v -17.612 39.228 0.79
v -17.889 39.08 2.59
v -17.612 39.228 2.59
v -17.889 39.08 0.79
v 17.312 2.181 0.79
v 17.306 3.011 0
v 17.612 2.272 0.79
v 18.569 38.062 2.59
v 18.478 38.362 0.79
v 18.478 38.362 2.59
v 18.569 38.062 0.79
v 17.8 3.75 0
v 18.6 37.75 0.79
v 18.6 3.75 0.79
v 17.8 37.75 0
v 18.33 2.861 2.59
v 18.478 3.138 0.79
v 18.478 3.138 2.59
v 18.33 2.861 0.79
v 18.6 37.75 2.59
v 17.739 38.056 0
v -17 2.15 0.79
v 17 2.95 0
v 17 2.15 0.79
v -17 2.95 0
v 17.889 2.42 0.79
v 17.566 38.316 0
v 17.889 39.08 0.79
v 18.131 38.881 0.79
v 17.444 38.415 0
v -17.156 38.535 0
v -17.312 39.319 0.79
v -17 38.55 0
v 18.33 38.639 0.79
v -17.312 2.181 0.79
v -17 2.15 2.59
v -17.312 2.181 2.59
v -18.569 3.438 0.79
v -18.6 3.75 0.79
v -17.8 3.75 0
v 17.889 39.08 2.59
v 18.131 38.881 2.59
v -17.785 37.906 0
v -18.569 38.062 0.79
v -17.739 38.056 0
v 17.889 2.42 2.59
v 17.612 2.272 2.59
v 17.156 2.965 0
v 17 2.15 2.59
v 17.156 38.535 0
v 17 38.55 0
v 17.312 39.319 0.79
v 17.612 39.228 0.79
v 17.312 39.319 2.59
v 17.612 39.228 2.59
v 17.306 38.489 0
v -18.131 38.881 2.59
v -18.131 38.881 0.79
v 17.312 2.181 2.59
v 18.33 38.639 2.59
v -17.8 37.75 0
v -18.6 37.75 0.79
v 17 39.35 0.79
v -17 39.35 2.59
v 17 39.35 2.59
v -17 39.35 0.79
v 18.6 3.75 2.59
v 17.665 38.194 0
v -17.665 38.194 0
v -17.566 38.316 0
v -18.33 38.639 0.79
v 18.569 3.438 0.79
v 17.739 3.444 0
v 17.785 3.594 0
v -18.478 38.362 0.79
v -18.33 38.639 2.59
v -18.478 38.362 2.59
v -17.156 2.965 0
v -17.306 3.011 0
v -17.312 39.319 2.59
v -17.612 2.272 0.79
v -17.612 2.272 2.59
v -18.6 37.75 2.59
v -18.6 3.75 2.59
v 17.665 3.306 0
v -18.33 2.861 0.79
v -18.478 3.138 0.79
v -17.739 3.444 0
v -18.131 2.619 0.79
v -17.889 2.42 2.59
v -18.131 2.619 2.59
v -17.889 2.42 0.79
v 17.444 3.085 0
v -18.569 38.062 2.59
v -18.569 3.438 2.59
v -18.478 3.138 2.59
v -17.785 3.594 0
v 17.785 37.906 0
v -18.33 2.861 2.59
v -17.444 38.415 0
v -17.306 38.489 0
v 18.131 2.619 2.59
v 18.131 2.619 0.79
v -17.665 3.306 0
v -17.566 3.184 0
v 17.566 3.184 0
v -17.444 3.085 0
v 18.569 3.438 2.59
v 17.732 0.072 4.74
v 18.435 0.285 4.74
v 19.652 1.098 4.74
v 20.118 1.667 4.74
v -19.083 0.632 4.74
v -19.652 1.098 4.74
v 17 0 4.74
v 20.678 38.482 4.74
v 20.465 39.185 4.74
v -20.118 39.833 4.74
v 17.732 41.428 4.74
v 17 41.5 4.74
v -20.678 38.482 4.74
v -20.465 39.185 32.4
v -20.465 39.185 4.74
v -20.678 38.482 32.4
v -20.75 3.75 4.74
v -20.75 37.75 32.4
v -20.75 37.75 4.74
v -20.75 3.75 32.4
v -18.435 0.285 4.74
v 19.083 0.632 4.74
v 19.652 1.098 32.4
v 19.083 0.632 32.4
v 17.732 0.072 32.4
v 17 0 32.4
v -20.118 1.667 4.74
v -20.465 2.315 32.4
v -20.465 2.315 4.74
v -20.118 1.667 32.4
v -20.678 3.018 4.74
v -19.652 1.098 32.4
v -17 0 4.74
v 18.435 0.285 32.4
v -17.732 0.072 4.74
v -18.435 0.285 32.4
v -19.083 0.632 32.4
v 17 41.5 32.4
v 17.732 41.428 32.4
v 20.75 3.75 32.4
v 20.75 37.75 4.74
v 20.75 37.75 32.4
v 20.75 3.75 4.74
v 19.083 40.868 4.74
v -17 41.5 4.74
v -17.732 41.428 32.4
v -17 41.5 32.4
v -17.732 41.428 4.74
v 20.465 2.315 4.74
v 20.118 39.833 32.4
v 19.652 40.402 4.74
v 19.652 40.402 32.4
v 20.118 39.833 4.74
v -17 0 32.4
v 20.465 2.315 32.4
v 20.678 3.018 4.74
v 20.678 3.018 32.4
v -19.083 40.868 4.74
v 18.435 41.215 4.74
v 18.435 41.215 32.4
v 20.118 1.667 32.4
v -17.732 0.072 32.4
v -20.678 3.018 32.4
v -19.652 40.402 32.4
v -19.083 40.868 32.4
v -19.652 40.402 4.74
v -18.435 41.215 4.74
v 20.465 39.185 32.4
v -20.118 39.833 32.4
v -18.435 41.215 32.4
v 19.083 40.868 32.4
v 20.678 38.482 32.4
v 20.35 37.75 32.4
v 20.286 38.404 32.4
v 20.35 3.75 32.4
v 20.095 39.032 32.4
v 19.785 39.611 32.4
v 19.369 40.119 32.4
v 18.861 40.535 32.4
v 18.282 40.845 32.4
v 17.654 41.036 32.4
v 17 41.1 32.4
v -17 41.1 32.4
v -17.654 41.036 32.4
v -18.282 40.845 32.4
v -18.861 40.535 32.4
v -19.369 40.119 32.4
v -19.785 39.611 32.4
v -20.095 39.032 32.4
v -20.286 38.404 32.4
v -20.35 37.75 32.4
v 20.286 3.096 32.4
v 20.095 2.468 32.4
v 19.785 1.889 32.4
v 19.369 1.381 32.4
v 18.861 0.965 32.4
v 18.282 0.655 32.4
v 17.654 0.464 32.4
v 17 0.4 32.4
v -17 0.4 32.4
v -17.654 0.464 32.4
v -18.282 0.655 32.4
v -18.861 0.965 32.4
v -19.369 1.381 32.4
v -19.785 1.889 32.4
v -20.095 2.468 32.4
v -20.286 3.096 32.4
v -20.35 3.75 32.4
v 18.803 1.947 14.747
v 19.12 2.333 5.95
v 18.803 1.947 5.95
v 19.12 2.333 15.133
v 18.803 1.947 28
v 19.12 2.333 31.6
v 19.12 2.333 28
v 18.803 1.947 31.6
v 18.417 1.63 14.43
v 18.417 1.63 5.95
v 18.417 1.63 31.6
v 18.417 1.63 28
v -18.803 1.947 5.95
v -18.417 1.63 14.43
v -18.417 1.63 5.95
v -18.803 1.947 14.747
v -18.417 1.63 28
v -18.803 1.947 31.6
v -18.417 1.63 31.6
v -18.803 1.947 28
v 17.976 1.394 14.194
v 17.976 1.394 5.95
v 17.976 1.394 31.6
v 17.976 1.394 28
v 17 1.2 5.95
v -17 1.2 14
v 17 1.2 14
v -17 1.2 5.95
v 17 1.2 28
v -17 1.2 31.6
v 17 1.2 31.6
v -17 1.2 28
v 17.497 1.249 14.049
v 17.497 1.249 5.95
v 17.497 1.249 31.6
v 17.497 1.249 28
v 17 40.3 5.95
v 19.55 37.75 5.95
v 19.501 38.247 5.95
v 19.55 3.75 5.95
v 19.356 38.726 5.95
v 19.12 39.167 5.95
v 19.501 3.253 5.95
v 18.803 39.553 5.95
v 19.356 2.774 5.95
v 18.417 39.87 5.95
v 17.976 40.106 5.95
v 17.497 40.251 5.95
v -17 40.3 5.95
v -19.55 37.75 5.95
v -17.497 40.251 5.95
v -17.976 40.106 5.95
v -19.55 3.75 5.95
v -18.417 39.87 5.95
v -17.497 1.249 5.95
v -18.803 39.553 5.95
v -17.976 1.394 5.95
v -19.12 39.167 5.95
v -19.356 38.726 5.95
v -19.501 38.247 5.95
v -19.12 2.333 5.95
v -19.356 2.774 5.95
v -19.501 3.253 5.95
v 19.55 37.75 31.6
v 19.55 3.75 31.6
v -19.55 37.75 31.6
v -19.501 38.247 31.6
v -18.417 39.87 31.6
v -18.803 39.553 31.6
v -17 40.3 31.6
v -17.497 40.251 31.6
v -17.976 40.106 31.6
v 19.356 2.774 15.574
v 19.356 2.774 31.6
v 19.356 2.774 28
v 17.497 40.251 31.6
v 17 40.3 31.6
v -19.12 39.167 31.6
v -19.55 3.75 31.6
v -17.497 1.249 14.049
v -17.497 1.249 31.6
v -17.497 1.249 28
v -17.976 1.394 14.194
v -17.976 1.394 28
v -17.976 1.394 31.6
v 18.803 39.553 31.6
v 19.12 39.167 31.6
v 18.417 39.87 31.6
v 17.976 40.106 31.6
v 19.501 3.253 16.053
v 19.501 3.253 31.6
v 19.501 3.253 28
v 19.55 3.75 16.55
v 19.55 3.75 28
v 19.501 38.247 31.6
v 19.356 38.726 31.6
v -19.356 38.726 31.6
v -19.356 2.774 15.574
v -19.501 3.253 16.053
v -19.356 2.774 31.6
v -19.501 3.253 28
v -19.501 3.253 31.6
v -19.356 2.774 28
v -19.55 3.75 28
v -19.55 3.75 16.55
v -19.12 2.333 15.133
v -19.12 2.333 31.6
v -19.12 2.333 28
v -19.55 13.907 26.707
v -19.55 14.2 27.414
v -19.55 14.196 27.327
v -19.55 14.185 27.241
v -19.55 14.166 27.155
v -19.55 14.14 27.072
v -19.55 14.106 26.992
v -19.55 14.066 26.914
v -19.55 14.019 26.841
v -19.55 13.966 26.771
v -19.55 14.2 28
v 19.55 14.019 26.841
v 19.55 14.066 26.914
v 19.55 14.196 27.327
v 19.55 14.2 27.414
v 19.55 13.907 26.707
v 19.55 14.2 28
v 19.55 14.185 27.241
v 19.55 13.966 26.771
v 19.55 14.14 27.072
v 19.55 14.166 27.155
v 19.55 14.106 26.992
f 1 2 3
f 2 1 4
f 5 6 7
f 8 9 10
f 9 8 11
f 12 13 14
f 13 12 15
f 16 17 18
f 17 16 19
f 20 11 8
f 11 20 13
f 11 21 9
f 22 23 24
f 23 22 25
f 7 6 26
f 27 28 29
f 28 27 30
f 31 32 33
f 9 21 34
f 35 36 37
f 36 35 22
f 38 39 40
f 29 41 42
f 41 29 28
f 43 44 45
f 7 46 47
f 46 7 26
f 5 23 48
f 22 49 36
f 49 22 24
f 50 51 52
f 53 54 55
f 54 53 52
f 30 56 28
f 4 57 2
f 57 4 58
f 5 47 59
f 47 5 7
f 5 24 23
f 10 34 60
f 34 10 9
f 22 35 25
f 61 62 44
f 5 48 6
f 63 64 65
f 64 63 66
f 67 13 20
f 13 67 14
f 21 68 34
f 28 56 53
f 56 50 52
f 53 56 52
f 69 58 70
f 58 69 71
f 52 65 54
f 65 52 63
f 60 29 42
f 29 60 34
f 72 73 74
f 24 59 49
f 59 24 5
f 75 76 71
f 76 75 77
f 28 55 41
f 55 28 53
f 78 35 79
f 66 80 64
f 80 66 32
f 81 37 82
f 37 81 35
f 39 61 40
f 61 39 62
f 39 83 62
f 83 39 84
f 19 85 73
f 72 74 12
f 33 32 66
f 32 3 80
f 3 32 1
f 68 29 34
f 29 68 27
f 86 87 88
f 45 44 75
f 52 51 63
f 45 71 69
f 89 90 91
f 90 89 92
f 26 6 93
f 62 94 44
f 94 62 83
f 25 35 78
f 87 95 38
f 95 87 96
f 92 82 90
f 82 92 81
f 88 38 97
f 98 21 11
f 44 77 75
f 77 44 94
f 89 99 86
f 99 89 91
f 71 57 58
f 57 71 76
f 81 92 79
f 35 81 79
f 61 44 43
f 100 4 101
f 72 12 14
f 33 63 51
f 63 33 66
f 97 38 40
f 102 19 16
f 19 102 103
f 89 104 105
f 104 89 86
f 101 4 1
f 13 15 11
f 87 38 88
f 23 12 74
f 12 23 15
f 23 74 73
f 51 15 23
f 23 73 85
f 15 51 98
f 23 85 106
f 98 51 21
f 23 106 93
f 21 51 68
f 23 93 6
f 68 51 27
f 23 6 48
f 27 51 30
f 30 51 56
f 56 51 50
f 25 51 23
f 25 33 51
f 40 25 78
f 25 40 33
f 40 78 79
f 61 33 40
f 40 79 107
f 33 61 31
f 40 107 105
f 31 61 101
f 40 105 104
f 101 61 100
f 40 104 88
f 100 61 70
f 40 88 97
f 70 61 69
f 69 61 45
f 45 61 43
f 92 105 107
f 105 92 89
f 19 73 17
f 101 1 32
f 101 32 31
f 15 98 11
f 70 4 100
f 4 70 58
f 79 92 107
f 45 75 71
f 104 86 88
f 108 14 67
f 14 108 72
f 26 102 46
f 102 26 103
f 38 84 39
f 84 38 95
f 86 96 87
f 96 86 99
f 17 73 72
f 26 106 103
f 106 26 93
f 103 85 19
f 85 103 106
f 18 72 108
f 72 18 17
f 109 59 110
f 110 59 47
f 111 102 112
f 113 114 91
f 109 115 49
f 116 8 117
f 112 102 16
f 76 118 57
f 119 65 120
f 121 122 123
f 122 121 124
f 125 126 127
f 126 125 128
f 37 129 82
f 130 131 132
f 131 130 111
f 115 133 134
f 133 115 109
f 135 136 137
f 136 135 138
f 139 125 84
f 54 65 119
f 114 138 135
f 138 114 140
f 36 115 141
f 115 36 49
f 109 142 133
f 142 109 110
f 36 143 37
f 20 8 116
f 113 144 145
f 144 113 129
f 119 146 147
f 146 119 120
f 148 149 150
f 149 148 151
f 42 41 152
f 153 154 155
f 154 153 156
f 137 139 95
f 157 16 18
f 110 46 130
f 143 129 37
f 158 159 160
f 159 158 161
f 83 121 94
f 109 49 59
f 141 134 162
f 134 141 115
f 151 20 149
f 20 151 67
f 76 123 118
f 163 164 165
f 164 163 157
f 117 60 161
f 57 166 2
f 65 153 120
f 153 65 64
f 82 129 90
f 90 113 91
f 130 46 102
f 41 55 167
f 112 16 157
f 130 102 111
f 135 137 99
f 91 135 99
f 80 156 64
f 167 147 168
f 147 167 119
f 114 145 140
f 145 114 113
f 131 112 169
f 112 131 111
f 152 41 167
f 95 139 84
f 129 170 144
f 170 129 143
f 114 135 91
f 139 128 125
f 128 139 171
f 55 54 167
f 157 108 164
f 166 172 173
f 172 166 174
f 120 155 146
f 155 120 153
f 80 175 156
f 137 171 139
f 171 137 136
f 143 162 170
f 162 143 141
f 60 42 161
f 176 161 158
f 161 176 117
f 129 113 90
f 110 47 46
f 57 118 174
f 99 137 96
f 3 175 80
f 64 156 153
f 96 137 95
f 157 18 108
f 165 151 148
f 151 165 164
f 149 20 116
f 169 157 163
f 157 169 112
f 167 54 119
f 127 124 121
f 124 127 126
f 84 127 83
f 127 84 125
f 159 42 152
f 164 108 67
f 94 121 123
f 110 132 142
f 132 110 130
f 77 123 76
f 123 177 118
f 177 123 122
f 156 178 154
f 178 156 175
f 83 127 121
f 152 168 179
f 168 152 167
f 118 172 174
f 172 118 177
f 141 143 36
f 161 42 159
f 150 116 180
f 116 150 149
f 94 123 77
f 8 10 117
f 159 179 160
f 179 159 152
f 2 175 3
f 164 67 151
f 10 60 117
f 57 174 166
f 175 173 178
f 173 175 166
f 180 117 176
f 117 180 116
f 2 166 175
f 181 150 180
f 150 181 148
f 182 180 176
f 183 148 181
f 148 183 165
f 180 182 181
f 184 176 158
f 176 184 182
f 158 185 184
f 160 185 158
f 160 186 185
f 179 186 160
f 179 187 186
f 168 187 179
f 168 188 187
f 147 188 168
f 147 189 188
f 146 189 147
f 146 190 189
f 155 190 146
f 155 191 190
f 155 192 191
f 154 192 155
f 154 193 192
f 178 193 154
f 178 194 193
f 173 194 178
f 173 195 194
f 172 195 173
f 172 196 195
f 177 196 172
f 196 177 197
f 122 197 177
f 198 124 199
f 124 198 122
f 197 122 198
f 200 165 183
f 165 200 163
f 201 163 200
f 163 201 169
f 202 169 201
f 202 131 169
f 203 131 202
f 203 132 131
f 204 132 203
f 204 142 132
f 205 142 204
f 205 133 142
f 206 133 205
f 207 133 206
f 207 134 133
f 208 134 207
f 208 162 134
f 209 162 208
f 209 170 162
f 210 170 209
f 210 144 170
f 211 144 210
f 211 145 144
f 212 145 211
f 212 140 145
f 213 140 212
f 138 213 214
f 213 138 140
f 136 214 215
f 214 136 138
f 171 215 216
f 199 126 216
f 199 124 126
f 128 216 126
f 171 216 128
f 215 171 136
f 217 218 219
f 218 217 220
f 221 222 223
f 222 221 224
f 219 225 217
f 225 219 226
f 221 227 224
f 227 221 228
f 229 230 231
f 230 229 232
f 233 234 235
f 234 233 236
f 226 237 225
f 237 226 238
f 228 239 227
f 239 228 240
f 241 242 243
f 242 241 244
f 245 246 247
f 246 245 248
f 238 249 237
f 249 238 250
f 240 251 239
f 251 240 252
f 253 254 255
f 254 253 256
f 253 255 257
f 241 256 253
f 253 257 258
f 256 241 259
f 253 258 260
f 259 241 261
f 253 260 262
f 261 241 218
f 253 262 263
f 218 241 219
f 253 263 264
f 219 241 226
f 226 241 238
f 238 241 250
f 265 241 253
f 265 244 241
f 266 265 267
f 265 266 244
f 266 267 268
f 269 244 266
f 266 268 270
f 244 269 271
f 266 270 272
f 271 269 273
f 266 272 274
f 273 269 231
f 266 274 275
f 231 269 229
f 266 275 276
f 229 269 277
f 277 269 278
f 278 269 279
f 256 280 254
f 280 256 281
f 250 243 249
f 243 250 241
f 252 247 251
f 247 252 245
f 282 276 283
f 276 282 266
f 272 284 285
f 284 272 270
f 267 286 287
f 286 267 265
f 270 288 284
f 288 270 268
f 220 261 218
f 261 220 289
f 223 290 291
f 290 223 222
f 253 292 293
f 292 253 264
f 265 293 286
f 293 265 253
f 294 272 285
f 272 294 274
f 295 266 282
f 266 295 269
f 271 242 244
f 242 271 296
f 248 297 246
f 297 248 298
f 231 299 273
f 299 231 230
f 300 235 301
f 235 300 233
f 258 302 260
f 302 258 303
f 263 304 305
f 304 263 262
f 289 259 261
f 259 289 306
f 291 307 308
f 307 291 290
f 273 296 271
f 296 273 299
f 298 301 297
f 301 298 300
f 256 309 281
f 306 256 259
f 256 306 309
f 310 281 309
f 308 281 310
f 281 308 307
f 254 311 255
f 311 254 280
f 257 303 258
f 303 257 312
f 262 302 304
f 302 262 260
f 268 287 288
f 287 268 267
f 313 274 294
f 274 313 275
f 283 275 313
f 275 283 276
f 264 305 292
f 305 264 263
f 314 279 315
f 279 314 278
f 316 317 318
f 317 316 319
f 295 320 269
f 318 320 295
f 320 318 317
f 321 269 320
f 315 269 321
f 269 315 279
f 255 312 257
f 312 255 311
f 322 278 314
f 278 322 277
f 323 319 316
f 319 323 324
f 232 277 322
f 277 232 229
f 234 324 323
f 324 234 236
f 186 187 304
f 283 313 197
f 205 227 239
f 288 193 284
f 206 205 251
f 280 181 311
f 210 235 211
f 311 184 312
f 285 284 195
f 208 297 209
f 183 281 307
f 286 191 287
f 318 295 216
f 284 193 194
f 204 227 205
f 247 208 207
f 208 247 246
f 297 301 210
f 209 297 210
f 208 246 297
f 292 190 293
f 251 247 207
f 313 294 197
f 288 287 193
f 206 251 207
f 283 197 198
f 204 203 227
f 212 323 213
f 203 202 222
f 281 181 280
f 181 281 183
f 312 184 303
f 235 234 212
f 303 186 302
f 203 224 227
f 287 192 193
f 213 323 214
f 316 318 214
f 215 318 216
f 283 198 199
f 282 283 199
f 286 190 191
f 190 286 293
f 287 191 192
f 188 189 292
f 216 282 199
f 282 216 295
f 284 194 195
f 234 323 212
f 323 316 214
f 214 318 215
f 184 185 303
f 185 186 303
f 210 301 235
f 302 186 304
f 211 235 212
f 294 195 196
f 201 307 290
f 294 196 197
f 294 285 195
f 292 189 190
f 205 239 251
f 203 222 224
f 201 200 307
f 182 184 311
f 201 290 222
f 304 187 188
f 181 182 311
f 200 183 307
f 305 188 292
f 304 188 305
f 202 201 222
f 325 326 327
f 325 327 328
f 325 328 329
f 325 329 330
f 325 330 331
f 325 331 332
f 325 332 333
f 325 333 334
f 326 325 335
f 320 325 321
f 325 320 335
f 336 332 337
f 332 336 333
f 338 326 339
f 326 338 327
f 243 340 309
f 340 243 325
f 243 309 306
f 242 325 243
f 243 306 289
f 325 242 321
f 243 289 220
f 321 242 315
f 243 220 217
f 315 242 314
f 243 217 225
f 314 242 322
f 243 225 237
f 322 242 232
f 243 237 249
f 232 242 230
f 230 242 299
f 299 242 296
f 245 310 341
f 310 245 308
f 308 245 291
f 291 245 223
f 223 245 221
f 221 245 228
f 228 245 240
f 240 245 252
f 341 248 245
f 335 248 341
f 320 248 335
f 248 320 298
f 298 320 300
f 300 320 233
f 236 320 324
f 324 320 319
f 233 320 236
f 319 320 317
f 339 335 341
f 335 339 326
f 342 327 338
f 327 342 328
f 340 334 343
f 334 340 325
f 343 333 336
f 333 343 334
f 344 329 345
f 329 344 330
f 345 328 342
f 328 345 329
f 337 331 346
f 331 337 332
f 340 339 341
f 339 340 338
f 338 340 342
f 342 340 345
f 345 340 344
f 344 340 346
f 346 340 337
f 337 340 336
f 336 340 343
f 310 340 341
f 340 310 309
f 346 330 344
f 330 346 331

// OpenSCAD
// file: ../../../modules/gridfinity.scad
// Gridfinity ベースプレートの共有 module。
// 寸法は Gridfinity 仕様 (Zack Freedman) の baseplate 輪郭に従う:
//   ピッチ 42、ソケット上端開口 41.5 (角 R4)、上から 45° 面取り 2.15 →
//   垂直 1.8 (37.2 角・R1.85) → 45° 面取り 0.7 → 底 35.8 角 (R1.15)。
//   ソケット深さ = 2.15 + 1.8 + 0.7 = 4.65。
//
// 座標系: X が列方向 (中央が 0)、Y が行方向 (板の前端が 0)、Z=0 が板の底面。
// 板の外形は grid とは独立に rim で与えるので、grid より大きい板 (縁付き) を
// 作れる。ソケットは rim=[left, right, front, back] の内側へ 42 ピッチで並ぶ。

gf_pitch = 42;
gf_socket_top = 41.5; // 上端開口
gf_socket_mid = 37.2; // 垂直部
gf_socket_bot = 35.8; // 底
gf_socket_r_top = 4;
gf_socket_r_mid = 1.85;
gf_socket_r_bot = 1.15;
gf_chamfer_top = 2.15;
gf_wall_h = 1.8;
gf_chamfer_bot = 0.7;
gf_socket_depth = gf_chamfer_top + gf_wall_h + gf_chamfer_bot; // 4.65
gf_fn = 32;
gf_eps = 0.01; // hull 用の薄板の厚さ
gf_over = 0.5; // 切削の抜き代

// 角丸正方形または矩形 (w は一辺、または [幅, 奥行き]、角 R)
module
gf_rounded_square(w, r)
{
    offset(r = r, $fn = gf_fn)
        square(is_list(w) ? w - [ 2 * r, 2 * r ] : w - 2 * r, center = true);
}

// 厚さ gf_eps の角丸正方形の薄板を z に置く (hull の骨)
module
gf_slab(w, r, z)
{
    translate([ 0, 0, z ]) linear_extrude(gf_eps) gf_rounded_square(w, r);
}

// ソケット1個の切削体。z=0 がソケットの底 (床の天面)、+Z へ 4.65 で天面に出る。
// clearance は嵌合の逃げで、輪郭を全周へ clearance だけ外へ出す (幅 +2c、角 R
// +c)。pitch_x は X 方向のセル幅。端数でも角 R と面取りの寸法を保つ。
module
gf_socket_cut(clearance = 0, pitch_x = gf_pitch)
{
    z1 = gf_chamfer_bot;
    z2 = z1 + gf_wall_h;
    z3 = gf_socket_depth;
    c = clearance;
    assert(pitch_x > gf_pitch - gf_socket_top + 2 * gf_socket_r_top,
           "Cell width is too small for the socket corner radius");
    delta = [ pitch_x - gf_pitch, 0 ];
    bot = [ gf_socket_bot + 2 * c, gf_socket_bot + 2 * c ] + delta;
    mid = [ gf_socket_mid + 2 * c, gf_socket_mid + 2 * c ] + delta;
    top = [ gf_socket_top + 2 * c, gf_socket_top + 2 * c ] + delta;
    hull()
    {
        gf_slab(bot, gf_socket_r_bot + c, 0);
        gf_slab(mid, gf_socket_r_mid + c, z1 - gf_eps);
    }
    hull()
    {
        gf_slab(mid, gf_socket_r_mid + c, z1 - gf_eps);
        gf_slab(mid, gf_socket_r_mid + c, z2 - gf_eps);
    }
    hull()
    {
        gf_slab(mid, gf_socket_r_mid + c, z2 - gf_eps);
        gf_slab(top, gf_socket_r_top + c, z3 - gf_eps);
    }
    // 天面より上へ抜く (天面と同一平面の退化した面を残さない)
    gf_slab(top, gf_socket_r_top + c, z3 - gf_eps);
    translate([ 0, 0, z3 - gf_eps ]) linear_extrude(gf_over + gf_eps)
        gf_rounded_square(top, gf_socket_r_top + c);
}

// ベースプレート。cols x rows のソケットを床 floor_t の上に彫る。
// rim = [left, right, front, back] はソケット列の外側に残す縁の幅。
// 板の幅 = cols*42 + left + right、奥行き = rows*42 + front + back。
// cols の端数は左端の細幅セルになる。rows は正の整数。
// clearance はソケットの嵌合の逃げ (gf_socket_cut を参照)。
module
gf_baseplate(cols, rows, rim = [ 0, 0, 0, 0 ], floor_t = 1, clearance = 0)
{
    grid_w = cols * gf_pitch;
    grid_d = rows * gf_pitch;
    plate_w = grid_w + rim[0] + rim[1];
    plate_d = grid_d + rim[2] + rim[3];
    x0 = -plate_w / 2 + rim[0]; // ソケット列の左端
    first_pitch = grid_w - (ceil(cols) - 1) * gf_pitch;
    difference()
    {
        translate([ -plate_w / 2, 0, 0 ])
            cube([ plate_w, plate_d, floor_t + gf_socket_depth ]);
        for (c = [0:ceil(cols) - 1], r = [0:rows - 1])
            translate([
                x0 + (c == 0 ? first_pitch / 2
                             : first_pitch + (c - 0.5) * gf_pitch),
                rim[2] + (r + 0.5) * gf_pitch,
                floor_t
            ]) gf_socket_cut(clearance, c == 0 ? first_pitch : gf_pitch);
    }
}
// file: ../../../modules/gridfinity_bins.scad
include <gridfinity_bin.scad>

// assets/gridfinity-bin/ の bin 群の共通値と、サイズ 3 引数の払い出し口。
// 単体では何も描かない。設計の経緯と確定値は
// ledger/designs/gridfinity-bin-4u.md が正本。
// 通常binは4U/9U、X={1,1.5,2,2.5,3} × Y={1,2,3,4,5,5.5}。
// 両軸に端数を持つ組み合わせはassetに置かない（各高さ28種）。
// Xが横、Yがラベルの壁から奥、unitsが高さ（7mm単位）。
wall = 1.2;    // 0.4 ノズル 3 本
floor_t = 1.2; // 底 (4.75) の上に載せる床。床の天面 z = 5.95
label_d = 13;  // 12mm 幅のラベルシールを貼る天板の張り出し
label_t = 1; // 天板の厚さ (user 指定)。下は 45° の無垢のくさび
label_r = 1; // 天板の先端と 45° 面の境目の R (user 指定)
// カードケース (goods/card_case_2x3x4u.scad) の値。カードは ISO/IEC 7810 ID-1 (85.6 × 54 ×
// 0.76、隅 R3) で、長辺を Y (rows 方向) に寝かせ、X 中央・手前の壁から 10 奥に置く。ポケットは
// カードより 1 大きい (片側 0.5)。右奥のマスは壁の内面まで抜き、床と底を外形に平行な 45° の窪みにする。
// ポケットの左右の埋めの天面 (幅 13.05) が 12mm のラベルを貼る帯。ポケットと穴の交点の
// 縦エッジは丸める (開口の上縁は丸めない: 壁を上端まで垂直に保ち、収まる枚数を減らさない)
card_w = 54;    // カードの短辺 (X)。user 指定「高さ 54」
card_d = 85.6;  // カードの長辺 (Y)。user 指定「幅 85.6」
card_clear = 1; // ポケットの余裕 (user 指定「+1mm」)
// ポケットの手前の辺の、手前の壁の内面からの距離 (user 指定「10mm」)
card_off = 10;
// ポケットの平面の隅 R (user 指定「角の丸み 3mm」。ID-1 の隅は 2.88..3.48)
card_r = 3;
// ポケットと穴が交わる所の、埋めの凸の縦エッジの R (指の当たる角)
card_edge_r = 2;
recess_skin = floor_t + 1.75; // 窪みの床 z (底の皮)。user 指定「壁厚と同じ 1.2 は過剰、1.75 返す」

function bin_contract(cols, rows, units) = str("CONTRACT units=",
                                               units,
                                               " pitch=",
                                               gf_pitch,
                                               " outer=",
                                               gfb_outer,
                                               " h=",
                                               units* gfb_unit,
                                               " lip=",
                                               gfb_lip_h,
                                               " base=",
                                               gfb_base_bot,
                                               "/",
                                               gfb_base_mid,
                                               "/",
                                               gfb_outer,
                                               " base_h=",
                                               gfb_base_h,
                                               " wall=",
                                               wall,
                                               " floor_top=",
                                               gfb_base_h + floor_t,
                                               " label=",
                                               label_d,
                                               "x",
                                               label_t,
                                               " wedge=45 fillet=",
                                               label_r,
                                               " bin=",
                                               cols,
                                               "x",
                                               rows,
                                               " size=",
                                               cols* gf_pitch - 0.5,
                                               "x",
                                               rows* gf_pitch - 0.5);

// (cols, rows, units) でラベル付き bin を払い出す。例: gridfinity_bin(2, 4, 4)
module
gridfinity_bin(cols, rows, units = 4)
{
    echo(bin_contract(cols, rows, units));
    gfb_bin(cols, rows, units, wall, floor_t, label_d, label_t, label_r);
}

function card_contract(cols, rows, units) = str("CONTRACT card units=",
                                                units,
                                                " bin=",
                                                cols,
                                                "x",
                                                rows,
                                                " size=",
                                                cols* gf_pitch - 0.5,
                                                "x",
                                                rows* gf_pitch - 0.5,
                                                " h=",
                                                units* gfb_unit,
                                                " lip=",
                                                gfb_lip_h,
                                                " floor_top=",
                                                gfb_base_h + floor_t,
                                                " card=",
                                                card_w,
                                                "x",
                                                card_d,
                                                " pocket=",
                                                card_w + card_clear,
                                                "x",
                                                card_d + card_clear,
                                                " at=",
                                                -(card_w + card_clear) / 2,
                                                ",",
                                                wall + card_off,
                                                " hole=",
                                                (cols - 1) / 2 * gf_pitch - gfb_outer / 2,
                                                ",",
                                                (rows - 0.5) * gf_pitch - 0.25 - gfb_outer / 2,
                                                " hole_r=",
                                                gfb_outer_r - wall,
                                                " recess=",
                                                gfb_outer - 2 * wall,
                                                "/",
                                                gfb_base_mid - 2 * wall,
                                                " recess_floor=",
                                                recess_skin,
                                                " r=",
                                                card_r,
                                                " edge_r=",
                                                card_edge_r);

// (cols, rows, units) でカードケースを払い出す。例: gridfinity_card_case(2, 3, 4)
module
gridfinity_card_case(cols, rows, units = 4)
{
    echo(card_contract(cols, rows, units));
    gfb_card_case(cols,
                  rows,
                  units,
                  wall,
                  floor_t,
                  [ card_w, card_d ],
                  card_clear,
                  card_off,
                  card_r,
                  recess_skin,
                  card_edge_r);
}
// main file
include <../../../modules/gridfinity_bins.scad>

gridfinity_bin(1, 1, 4);
